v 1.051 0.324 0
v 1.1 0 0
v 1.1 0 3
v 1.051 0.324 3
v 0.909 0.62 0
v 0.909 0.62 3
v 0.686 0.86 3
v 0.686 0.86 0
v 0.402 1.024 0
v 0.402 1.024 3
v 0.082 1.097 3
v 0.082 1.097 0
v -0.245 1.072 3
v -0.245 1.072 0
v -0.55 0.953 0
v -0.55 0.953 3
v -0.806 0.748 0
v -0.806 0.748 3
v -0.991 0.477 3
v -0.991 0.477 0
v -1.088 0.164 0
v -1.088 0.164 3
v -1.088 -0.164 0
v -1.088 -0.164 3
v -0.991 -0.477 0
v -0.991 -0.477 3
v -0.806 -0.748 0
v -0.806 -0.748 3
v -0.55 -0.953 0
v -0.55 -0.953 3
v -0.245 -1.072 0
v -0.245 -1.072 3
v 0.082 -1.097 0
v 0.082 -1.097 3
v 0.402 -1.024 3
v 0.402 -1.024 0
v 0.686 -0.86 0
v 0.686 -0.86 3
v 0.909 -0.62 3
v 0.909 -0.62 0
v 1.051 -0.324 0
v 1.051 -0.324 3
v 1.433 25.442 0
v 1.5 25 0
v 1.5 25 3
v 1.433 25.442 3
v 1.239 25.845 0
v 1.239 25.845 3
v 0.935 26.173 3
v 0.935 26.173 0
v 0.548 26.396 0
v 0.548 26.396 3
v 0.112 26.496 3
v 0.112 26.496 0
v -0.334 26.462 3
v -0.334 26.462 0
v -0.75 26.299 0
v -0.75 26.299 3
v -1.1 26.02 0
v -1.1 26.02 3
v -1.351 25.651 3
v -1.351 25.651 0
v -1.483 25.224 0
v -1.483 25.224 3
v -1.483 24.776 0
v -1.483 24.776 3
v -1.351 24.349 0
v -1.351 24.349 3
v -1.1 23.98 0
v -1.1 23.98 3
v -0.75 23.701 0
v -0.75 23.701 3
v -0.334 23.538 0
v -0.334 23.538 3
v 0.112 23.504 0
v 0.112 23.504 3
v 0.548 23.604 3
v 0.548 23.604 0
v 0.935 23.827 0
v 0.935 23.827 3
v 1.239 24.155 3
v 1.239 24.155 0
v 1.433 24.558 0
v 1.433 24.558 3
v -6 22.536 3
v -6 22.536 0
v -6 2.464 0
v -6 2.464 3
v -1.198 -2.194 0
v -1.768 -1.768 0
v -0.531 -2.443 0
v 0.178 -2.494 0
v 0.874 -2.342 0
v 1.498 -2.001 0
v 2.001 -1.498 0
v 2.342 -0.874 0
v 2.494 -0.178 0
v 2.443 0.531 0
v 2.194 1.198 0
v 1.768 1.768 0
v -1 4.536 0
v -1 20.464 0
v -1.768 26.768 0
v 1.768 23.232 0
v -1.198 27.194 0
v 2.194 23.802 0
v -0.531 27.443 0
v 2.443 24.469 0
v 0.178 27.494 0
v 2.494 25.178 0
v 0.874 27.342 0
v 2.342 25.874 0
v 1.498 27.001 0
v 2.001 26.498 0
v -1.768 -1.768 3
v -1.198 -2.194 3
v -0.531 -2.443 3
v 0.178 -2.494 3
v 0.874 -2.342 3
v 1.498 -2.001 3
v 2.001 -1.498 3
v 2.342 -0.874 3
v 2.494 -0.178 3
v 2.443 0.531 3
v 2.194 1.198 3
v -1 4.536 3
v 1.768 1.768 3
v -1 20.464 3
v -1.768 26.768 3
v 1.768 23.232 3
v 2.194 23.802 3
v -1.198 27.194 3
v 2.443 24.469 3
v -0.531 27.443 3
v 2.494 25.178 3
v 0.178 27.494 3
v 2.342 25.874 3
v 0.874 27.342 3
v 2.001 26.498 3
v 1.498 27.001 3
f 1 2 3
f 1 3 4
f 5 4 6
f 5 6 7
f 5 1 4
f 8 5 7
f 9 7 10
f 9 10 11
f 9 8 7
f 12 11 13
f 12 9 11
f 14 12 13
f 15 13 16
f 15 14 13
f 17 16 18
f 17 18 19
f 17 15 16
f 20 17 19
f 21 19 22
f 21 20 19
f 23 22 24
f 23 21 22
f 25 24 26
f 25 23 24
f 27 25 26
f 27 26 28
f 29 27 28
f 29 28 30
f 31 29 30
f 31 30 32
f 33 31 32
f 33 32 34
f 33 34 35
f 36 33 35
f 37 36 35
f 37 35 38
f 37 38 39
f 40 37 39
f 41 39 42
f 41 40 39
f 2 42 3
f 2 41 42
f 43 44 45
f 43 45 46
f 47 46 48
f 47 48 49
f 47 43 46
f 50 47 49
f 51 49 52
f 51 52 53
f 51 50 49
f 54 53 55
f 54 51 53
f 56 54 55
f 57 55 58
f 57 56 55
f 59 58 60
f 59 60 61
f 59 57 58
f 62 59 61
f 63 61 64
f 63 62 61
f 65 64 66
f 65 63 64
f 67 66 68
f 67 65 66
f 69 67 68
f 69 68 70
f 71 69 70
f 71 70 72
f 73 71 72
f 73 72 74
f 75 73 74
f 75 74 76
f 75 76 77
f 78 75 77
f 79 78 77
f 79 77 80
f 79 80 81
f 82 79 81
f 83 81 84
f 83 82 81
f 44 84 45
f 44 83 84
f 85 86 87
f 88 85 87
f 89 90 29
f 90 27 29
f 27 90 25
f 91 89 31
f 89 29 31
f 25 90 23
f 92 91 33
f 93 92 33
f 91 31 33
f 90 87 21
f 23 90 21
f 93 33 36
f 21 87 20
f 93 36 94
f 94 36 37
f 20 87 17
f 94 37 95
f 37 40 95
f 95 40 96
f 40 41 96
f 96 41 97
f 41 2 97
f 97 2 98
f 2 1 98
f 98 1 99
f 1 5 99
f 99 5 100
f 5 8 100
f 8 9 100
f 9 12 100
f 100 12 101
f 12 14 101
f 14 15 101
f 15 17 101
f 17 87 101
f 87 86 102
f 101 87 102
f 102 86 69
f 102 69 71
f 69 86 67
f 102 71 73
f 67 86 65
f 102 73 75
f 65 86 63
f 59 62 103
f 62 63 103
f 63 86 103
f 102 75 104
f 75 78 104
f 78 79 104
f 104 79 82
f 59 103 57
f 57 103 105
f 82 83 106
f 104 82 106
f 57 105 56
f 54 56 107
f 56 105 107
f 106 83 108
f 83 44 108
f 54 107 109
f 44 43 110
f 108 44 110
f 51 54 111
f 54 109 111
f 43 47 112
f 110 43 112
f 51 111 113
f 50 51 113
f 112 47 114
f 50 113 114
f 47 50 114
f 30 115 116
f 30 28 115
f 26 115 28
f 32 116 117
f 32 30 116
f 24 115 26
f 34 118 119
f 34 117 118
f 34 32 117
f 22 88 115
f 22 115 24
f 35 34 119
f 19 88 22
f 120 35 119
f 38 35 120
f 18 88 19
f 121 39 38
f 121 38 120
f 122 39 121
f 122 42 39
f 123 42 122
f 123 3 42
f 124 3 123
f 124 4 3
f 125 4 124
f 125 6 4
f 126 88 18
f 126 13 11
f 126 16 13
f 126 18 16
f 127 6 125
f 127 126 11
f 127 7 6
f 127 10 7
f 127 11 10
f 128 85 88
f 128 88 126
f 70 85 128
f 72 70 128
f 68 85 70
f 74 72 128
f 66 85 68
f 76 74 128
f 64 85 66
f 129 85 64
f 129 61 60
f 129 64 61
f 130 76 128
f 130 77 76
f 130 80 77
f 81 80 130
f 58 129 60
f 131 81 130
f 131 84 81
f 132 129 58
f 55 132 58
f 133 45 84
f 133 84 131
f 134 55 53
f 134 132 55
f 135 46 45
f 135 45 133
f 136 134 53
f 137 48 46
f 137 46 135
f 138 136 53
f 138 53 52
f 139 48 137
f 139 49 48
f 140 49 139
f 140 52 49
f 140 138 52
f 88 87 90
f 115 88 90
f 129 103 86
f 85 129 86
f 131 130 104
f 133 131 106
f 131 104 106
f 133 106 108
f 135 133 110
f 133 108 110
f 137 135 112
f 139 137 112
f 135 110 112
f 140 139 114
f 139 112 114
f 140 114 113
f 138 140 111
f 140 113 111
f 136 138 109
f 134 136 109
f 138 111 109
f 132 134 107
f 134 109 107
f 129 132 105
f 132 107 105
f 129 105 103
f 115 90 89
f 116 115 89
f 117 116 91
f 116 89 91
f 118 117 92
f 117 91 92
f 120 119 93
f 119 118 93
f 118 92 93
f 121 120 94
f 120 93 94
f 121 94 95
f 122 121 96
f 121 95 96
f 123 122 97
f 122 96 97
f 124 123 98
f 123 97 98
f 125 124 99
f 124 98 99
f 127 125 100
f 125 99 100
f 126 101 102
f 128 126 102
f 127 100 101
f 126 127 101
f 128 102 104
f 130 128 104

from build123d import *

# Parameters (mm, degrees)
CROQUIS1_R              = 2.5
CROQUIS1_R_2            = 1.5
CROQUIS1_R_3            = 1.1
SALIENTE_EXTRUIR1_DEPTH = 3


with BuildPart() as part:
    # Croquis1 → Saliente-Extruir1 (new body)
    # profile 1 of 3: a face of its own
    with BuildSketch(Plane.XY):
        with BuildLine():
            ThreePointArc((-1.767766953, -1.767766953), (-1.767766953, 1.767766953), (1.767766953, 1.767766953))
            Line((1.767766953, 1.767766953), (-1, 4.535533906))
            Line((-1, 4.535533906), (-1, 20.464466094))
            Line((-1, 20.464466094), (1.767766953, 23.232233047))
            ThreePointArc((1.767766953, 23.232233047), (-1.767766953, 23.232233047), (-1.767766953, 26.767766953))
            Line((-1.767766953, 26.767766953), (-6, 22.535533906))
            Line((-6, 22.535533906), (-6, 2.464466094))
            Line((-6, 2.464466094), (-1.767766953, -1.767766953))
        make_face()
    # profile 2 of 3: a face of its own
    with BuildSketch(Plane.XY):
        with Locations((0, 25)):
            Circle(CROQUIS1_R)
        with Locations((0, 25)):
            Circle(CROQUIS1_R_2, mode=Mode.SUBTRACT)
    # profile 3 of 3: a face of its own
    with BuildSketch(Plane.XY):
        Circle(CROQUIS1_R)
        Circle(CROQUIS1_R_3, mode=Mode.SUBTRACT)
    extrude(amount=SALIENTE_EXTRUIR1_DEPTH)


solid = part.part
